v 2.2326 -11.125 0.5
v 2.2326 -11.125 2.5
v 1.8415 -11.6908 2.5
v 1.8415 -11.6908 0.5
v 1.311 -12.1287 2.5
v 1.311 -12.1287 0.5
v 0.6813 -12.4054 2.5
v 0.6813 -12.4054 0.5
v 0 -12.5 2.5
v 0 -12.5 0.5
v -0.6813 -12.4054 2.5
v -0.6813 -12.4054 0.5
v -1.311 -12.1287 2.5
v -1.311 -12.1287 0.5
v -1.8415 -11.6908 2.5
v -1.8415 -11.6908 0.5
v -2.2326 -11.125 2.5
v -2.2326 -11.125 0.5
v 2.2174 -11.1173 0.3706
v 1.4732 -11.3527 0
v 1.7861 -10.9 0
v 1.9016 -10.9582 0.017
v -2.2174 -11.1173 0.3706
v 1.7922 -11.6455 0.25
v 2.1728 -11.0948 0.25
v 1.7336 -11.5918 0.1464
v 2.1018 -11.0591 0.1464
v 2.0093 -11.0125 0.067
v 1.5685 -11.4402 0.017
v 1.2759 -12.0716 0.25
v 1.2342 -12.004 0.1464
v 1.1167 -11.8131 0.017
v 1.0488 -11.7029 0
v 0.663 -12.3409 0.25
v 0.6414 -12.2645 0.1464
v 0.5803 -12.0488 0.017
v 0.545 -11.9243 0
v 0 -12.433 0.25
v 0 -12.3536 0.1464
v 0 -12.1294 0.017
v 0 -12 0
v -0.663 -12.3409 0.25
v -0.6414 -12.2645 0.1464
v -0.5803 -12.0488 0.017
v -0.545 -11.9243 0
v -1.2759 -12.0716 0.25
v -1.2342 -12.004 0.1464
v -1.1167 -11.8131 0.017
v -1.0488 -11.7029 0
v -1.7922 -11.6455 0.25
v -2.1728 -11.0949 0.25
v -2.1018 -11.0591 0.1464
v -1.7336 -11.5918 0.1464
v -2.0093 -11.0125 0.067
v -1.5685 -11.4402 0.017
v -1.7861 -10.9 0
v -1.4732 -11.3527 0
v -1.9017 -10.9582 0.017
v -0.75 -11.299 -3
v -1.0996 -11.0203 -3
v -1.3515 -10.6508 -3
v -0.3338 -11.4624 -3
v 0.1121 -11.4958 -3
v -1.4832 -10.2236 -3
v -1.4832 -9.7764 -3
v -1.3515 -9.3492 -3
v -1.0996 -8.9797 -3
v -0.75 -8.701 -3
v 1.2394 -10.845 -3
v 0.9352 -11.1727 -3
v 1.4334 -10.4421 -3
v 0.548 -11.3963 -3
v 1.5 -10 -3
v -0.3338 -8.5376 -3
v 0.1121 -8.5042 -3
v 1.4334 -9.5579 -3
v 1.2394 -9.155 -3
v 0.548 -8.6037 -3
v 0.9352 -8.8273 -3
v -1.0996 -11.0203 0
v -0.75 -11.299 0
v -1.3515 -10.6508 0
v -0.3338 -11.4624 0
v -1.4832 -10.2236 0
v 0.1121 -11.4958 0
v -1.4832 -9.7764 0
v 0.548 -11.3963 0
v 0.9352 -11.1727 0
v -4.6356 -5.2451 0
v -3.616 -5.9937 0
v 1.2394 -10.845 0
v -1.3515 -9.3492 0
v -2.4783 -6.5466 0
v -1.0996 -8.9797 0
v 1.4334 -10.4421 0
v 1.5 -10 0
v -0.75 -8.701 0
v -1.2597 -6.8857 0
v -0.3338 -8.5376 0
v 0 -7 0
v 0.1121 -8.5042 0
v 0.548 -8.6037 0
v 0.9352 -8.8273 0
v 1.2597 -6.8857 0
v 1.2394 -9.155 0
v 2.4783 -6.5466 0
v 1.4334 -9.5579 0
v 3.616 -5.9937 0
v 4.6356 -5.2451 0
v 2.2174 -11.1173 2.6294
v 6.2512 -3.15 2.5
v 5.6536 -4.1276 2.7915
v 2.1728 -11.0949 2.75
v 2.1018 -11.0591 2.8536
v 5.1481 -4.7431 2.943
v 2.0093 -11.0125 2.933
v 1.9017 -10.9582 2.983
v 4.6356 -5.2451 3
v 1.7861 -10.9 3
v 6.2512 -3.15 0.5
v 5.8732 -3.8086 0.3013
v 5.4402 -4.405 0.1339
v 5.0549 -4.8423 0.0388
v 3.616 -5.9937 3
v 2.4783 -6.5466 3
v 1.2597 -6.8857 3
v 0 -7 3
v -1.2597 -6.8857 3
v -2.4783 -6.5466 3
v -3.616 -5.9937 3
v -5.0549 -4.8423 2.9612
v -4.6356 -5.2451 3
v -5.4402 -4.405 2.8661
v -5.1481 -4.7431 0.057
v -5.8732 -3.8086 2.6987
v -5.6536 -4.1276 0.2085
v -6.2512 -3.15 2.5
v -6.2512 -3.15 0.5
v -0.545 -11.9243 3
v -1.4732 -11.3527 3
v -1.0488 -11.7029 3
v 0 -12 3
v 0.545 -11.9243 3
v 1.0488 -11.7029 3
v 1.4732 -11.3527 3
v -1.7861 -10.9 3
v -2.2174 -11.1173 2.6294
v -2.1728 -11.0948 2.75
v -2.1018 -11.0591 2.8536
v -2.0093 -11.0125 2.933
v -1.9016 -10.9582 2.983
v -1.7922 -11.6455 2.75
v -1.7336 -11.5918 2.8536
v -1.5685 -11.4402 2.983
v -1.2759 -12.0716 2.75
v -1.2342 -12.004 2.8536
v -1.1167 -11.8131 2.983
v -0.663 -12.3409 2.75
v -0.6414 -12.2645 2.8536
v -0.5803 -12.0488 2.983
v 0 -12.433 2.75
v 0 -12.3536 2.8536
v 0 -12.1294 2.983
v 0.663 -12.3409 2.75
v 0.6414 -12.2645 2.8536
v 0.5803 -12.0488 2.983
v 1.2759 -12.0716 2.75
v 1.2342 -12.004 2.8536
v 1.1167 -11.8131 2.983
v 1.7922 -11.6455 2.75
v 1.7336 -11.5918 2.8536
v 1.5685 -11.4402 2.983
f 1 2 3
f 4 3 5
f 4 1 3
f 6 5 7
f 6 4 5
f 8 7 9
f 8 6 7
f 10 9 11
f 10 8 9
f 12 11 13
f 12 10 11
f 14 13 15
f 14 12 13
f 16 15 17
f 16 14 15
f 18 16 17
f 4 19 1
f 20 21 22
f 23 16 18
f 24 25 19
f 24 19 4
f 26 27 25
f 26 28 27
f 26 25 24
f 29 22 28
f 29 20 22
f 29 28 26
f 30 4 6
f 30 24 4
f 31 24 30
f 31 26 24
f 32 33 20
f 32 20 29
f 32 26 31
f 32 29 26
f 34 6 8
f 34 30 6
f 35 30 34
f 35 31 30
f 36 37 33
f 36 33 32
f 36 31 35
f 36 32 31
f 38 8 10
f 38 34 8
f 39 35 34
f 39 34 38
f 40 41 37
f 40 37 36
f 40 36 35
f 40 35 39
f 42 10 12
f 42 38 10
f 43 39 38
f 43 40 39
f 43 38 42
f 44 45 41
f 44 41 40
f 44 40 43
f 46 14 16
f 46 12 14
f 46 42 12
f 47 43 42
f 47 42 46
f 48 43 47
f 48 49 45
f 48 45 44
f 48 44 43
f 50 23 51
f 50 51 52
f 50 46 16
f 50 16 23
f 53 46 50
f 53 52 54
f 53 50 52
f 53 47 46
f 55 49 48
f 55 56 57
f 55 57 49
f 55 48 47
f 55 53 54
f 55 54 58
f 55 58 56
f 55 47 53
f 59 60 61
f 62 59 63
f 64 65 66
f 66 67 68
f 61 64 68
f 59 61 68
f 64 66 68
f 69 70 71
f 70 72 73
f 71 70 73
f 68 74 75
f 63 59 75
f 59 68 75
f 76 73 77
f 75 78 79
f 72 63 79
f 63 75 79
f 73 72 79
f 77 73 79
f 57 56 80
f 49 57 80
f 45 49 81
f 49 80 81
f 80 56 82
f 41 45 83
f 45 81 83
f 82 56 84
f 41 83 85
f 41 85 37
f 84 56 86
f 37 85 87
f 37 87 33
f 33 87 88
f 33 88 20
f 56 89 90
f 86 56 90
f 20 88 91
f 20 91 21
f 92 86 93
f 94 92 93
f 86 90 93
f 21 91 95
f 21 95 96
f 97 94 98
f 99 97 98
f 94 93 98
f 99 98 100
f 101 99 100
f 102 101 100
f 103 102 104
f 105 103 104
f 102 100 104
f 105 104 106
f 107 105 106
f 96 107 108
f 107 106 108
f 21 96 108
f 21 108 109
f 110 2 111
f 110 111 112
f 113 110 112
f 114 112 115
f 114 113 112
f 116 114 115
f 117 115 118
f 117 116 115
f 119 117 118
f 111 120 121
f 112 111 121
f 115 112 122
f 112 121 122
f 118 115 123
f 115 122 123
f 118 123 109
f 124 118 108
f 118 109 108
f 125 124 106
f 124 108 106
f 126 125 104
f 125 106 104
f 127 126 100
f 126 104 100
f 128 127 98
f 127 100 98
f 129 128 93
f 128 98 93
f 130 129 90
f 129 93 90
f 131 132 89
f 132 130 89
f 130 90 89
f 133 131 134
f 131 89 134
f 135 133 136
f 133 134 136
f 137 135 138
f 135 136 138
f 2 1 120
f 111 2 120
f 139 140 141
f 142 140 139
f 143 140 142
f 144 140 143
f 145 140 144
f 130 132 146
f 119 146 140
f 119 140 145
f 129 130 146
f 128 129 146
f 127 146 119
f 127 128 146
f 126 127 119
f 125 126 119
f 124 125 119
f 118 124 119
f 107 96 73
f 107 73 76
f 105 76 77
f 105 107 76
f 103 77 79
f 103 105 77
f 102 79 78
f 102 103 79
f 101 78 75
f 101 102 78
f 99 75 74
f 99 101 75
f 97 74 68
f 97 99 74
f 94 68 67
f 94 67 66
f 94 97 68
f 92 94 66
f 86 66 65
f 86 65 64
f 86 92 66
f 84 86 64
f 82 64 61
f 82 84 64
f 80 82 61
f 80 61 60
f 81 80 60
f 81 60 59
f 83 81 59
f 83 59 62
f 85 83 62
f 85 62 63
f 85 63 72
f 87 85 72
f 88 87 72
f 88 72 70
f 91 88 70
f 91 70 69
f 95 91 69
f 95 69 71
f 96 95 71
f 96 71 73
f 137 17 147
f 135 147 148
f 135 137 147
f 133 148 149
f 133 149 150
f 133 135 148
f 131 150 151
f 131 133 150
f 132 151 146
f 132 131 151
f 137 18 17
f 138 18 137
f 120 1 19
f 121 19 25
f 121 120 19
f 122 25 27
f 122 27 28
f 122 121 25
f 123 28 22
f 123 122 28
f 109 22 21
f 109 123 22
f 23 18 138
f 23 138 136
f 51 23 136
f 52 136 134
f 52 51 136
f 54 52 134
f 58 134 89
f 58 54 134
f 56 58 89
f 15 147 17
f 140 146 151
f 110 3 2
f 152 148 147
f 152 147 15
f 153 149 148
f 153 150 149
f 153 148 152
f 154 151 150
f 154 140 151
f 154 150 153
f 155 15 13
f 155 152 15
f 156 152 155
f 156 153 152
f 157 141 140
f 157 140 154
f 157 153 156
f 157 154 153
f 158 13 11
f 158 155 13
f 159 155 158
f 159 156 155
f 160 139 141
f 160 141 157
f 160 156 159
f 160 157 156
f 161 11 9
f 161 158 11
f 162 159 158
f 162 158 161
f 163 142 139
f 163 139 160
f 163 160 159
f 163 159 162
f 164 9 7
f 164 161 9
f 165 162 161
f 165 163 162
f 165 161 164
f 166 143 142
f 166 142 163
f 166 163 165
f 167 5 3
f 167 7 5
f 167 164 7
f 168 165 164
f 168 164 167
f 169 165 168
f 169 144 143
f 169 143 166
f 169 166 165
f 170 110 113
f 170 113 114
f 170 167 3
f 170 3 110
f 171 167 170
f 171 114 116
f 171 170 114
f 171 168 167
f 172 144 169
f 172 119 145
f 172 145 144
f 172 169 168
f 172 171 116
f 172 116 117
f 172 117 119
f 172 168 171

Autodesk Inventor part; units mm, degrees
ref_plane "YZ Plane" through (0, 0, 0) normal (1, 0, 0) x (0, 1, 0)
ref_plane "XZ Plane" through (0, 0, 0) normal (0, 1, 0) x (-1, 0, 0)
ref_plane "XY Plane" through (0, 0, 0) normal (0, 0, 1) x (1, 0, 0)
sketch "Sketch1" plane through (0, 0, 0) normal (0, 0, 1) x (1, 0, 0)
  circle A0 centre (0, 0) radius 7
  circle A1 centre (0, -10) radius 1.5
  circle A2 centre (0, -10) radius 2.5
  line L0 (0, -16.4) -> (0, 10.9) projected
  line L1 (-2.2326, -11.125) -> (-6.2512, -3.15)
  line L2 (2.2326, -11.125) -> (6.2512, -3.15)
  dimension "d0" = 14
  dimension "d1" = 3
  dimension "d2" = 1
  dimension "d3" = 10
extrude "Extrusion1" add sketch "Sketch1" along normal blind 3 contours L2 A2 L0 A0 | L0 A2 L1 A0 | A2 L0 A1 | L0 A1 A2 | L0 A1 | A1 L0
extrude "Extrusion2" add sketch "Sketch1" against normal blind 3 contours L0 A1 | A1 L0
fillet "Fillet1" radius 0.5 6 edges at (0, -12.5, 3) (-4.2419, -7.1375, 3) (4.2419, -7.1375, 3) (0, -12.5, 0) (-4.2419, -7.1375, 0) (4.2419, -7.1375, 0)
properties part number "Joystick Extra Hook"
